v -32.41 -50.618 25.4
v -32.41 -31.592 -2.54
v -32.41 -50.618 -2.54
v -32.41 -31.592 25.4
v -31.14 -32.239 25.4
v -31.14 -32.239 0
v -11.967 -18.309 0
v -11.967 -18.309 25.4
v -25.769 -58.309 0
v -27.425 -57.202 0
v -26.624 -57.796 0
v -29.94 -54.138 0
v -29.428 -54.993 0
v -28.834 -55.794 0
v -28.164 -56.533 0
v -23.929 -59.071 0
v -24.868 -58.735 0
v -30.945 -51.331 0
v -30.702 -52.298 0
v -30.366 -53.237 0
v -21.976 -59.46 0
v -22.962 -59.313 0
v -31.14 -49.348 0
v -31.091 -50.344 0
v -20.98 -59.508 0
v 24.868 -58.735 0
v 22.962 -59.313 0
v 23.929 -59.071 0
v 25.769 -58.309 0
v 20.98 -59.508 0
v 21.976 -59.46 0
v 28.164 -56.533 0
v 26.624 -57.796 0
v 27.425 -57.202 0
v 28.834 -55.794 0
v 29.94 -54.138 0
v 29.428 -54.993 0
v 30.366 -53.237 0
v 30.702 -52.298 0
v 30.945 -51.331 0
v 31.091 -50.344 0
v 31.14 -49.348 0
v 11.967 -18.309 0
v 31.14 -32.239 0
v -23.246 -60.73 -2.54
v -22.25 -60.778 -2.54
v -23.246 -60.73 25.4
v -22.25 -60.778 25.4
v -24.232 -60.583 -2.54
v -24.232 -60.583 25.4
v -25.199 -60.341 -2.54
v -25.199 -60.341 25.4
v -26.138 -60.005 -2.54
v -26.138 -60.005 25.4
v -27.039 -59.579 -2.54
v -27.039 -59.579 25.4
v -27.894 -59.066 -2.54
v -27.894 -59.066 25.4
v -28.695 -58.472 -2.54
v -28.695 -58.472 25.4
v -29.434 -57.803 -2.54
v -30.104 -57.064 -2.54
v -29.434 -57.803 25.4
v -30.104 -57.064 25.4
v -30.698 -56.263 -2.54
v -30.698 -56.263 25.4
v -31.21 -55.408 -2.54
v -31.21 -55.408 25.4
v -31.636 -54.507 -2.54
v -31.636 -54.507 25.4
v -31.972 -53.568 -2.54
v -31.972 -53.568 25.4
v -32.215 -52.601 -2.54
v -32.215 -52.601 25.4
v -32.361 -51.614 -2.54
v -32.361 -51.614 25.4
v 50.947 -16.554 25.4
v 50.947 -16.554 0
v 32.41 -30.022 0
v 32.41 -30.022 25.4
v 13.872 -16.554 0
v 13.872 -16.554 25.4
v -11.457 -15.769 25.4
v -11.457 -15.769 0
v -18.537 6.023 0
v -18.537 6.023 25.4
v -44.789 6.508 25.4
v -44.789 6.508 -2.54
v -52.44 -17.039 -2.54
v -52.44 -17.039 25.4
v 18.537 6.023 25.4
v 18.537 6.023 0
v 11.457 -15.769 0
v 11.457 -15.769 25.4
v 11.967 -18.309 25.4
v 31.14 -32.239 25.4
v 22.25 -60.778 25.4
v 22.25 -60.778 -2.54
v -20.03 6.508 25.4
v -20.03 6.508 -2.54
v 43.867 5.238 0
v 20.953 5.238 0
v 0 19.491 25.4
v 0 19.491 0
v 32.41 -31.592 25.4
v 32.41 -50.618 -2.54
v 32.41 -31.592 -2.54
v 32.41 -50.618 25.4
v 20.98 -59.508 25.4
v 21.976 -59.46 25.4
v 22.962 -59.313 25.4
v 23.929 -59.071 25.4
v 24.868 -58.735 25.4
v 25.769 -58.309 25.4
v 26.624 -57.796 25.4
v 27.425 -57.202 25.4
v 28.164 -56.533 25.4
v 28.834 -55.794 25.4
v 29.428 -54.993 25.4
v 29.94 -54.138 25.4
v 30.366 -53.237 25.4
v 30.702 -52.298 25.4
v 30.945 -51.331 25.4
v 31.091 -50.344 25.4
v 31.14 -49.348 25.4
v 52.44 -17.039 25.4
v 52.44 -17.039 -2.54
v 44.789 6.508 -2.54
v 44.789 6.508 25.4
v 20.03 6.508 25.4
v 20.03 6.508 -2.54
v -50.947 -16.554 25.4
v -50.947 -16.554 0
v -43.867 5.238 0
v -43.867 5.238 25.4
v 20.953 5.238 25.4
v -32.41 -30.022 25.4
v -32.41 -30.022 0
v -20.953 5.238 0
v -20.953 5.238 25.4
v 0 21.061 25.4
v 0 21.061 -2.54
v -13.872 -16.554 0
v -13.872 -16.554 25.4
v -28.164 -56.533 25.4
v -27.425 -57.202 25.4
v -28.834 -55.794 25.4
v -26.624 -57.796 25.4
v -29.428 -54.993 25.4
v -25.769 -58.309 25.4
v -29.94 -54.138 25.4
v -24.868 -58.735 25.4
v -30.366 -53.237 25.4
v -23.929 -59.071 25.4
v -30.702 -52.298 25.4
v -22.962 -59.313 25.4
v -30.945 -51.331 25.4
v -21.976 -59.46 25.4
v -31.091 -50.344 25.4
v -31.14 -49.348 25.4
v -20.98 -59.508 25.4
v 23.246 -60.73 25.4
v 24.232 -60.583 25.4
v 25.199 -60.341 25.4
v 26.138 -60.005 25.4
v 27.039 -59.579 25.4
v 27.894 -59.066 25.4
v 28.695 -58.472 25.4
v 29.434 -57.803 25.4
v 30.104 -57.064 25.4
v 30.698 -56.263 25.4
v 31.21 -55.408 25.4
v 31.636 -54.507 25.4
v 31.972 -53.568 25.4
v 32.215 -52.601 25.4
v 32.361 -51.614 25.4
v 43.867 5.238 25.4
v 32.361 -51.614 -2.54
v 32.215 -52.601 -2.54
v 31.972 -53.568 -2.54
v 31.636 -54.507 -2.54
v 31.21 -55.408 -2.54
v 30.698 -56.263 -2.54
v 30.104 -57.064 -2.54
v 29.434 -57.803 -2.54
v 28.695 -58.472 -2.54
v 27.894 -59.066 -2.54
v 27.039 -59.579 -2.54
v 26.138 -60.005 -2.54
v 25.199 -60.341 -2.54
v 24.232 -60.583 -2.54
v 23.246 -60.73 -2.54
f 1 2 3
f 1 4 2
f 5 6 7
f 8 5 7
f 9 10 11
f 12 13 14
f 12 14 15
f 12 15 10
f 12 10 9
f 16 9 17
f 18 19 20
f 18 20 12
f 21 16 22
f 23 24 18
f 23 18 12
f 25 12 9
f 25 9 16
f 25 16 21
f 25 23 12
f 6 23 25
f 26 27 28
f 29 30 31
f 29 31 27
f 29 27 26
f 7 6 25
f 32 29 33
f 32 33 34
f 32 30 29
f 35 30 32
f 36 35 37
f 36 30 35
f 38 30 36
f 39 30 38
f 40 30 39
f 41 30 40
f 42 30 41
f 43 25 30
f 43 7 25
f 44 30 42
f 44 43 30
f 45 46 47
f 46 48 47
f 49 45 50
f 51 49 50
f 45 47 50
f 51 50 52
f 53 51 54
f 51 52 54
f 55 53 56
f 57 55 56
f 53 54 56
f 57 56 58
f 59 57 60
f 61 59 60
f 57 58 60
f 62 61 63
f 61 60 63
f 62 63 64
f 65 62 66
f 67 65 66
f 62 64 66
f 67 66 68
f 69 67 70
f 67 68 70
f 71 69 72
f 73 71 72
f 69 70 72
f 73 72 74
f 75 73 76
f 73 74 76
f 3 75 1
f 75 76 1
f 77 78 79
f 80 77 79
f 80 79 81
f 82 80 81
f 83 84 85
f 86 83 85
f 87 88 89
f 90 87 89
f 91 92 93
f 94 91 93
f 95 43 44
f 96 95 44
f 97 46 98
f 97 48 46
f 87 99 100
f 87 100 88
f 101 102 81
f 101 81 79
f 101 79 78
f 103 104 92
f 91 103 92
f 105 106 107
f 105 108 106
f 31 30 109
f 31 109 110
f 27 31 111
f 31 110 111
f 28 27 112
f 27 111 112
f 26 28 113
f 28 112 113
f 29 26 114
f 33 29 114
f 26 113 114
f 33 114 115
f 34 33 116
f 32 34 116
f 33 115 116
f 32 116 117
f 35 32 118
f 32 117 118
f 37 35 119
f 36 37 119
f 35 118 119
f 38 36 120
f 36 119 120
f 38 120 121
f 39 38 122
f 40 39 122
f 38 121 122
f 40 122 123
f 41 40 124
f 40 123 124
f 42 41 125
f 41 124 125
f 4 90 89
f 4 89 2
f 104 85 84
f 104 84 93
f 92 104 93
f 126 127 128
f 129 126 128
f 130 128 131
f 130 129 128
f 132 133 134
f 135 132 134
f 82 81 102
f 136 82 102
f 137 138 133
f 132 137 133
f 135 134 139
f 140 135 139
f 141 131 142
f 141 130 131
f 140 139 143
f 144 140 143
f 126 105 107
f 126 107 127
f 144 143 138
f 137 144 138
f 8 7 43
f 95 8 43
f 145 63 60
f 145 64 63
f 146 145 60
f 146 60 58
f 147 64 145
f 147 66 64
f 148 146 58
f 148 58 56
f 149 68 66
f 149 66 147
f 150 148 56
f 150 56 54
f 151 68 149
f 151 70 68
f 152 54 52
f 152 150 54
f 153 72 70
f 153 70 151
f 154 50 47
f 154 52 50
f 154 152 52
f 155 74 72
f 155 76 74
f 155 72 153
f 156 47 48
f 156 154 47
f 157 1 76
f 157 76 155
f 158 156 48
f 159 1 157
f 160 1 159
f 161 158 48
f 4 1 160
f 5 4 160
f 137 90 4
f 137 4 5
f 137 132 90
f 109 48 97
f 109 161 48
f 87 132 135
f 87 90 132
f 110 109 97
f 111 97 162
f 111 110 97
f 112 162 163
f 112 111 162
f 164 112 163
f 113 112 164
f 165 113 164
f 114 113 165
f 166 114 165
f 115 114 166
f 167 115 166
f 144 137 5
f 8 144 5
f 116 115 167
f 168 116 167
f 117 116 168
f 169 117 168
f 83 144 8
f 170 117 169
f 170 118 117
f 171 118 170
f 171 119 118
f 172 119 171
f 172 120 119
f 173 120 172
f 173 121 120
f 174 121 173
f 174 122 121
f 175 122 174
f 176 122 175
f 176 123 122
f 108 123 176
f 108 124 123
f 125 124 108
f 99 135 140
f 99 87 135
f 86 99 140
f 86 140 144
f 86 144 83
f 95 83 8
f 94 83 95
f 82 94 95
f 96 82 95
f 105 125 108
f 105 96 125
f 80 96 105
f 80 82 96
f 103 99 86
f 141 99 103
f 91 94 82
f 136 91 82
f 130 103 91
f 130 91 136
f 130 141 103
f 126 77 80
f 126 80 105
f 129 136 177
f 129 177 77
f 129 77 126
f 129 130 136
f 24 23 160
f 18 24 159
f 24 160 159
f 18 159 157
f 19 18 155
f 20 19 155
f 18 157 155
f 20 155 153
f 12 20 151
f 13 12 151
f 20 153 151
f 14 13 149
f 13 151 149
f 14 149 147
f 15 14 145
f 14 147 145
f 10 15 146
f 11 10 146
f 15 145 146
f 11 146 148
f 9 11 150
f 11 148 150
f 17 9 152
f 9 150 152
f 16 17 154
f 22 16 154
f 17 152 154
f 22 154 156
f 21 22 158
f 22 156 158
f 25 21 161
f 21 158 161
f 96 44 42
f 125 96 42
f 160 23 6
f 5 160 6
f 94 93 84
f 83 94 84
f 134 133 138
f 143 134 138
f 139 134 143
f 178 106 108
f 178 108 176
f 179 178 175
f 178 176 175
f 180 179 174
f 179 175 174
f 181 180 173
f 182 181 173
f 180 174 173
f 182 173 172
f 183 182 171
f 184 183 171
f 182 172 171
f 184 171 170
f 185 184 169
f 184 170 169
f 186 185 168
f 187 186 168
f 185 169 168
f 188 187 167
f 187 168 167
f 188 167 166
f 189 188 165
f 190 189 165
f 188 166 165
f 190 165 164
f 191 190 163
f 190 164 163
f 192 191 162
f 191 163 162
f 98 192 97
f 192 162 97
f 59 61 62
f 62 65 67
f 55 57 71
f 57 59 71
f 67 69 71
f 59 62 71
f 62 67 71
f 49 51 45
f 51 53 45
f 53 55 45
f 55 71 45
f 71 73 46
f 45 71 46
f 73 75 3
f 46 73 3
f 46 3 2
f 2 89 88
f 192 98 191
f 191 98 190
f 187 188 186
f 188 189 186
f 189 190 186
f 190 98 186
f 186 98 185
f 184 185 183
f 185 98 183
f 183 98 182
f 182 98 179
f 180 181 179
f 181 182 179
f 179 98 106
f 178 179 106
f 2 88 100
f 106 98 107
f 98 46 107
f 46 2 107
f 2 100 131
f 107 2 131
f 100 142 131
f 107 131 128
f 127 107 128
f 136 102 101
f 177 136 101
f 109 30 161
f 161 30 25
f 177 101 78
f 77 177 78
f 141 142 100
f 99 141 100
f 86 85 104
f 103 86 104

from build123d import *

# Parameters (mm, degrees)
F1_DEPTH = 25.4
F3_DEPTH = 2.54
F4_R     = 10.16


with BuildPart() as f1:
    # F0 (on Top) → F1 (new body)
    with BuildSketch(Plane.XY):
        Polygon((44.789236, 6.508257), (20.030355, 6.508257), (12.37944, -17.038838), (32.409796, -31.591743), (52.440151, -17.038838), align=None)
        Polygon((20.953064, 5.238257), (43.866527, 5.238257), (50.947177, -16.553741), (32.409796, -30.021937), (13.872415, -16.553741), align=None, mode=Mode.SUBTRACT)
        Polygon((12.37944, -17.038838), (20.030355, 6.508257), (0, 21.061162), (-20.030355, 6.508257), (-12.37944, -17.038838), align=None)
        Polygon((-18.537381, 6.02316), (0, 19.491356), (18.537381, 6.02316), (11.456731, -15.768838), (-11.456731, -15.768838), align=None, mode=Mode.SUBTRACT)
        Polygon((32.409796, -31.591743), (12.37944, -17.038838), (-12.37944, -17.038838), (-32.409796, -31.591743), (-32.409796, -60.778446), (32.409796, -60.778446), align=None)
        Polygon((31.139796, -32.23884), (31.139796, -59.508446), (-31.139796, -59.508446), (-31.139796, -32.23884), (-11.966792, -18.308838), (11.966792, -18.308838), align=None, mode=Mode.SUBTRACT)
        Polygon((-32.409796, -31.591743), (-12.37944, -17.038838), (-20.030355, 6.508257), (-44.789236, 6.508257), (-52.440151, -17.038838), align=None)
        Polygon((-43.866527, 5.238257), (-20.953064, 5.238257), (-13.872415, -16.553741), (-32.409796, -30.021937), (-50.947177, -16.553741), align=None, mode=Mode.SUBTRACT)
    extrude(amount=F1_DEPTH)

    # F2 (on Top) → F3 (join)
    with BuildSketch(Plane.XY):
        Polygon((0, 21.061162), (-20.030355, 6.508257), (-44.789236, 6.508257), (-52.440151, -17.038838), (-32.409796, -31.591743), (-32.409796, -60.778446), (32.409796, -60.778446), (32.409796, -31.591743), (52.440151, -17.038838), (44.789236, 6.508257), (20.030355, 6.508257), align=None)
    extrude(amount=-F3_DEPTH)

    # F4
    f4_edges = [f1.edges().sort_by_distance(p)[0] for p in [
        (32.409796, -60.778446, 11.43),
        (-32.409796, -60.778446, 11.43),
        (-31.139796, -59.508446, 12.7),
        (31.139796, -59.508446, 12.7),
    ]]
    fillet(f4_edges, radius=F4_R)


solid = f1.part
